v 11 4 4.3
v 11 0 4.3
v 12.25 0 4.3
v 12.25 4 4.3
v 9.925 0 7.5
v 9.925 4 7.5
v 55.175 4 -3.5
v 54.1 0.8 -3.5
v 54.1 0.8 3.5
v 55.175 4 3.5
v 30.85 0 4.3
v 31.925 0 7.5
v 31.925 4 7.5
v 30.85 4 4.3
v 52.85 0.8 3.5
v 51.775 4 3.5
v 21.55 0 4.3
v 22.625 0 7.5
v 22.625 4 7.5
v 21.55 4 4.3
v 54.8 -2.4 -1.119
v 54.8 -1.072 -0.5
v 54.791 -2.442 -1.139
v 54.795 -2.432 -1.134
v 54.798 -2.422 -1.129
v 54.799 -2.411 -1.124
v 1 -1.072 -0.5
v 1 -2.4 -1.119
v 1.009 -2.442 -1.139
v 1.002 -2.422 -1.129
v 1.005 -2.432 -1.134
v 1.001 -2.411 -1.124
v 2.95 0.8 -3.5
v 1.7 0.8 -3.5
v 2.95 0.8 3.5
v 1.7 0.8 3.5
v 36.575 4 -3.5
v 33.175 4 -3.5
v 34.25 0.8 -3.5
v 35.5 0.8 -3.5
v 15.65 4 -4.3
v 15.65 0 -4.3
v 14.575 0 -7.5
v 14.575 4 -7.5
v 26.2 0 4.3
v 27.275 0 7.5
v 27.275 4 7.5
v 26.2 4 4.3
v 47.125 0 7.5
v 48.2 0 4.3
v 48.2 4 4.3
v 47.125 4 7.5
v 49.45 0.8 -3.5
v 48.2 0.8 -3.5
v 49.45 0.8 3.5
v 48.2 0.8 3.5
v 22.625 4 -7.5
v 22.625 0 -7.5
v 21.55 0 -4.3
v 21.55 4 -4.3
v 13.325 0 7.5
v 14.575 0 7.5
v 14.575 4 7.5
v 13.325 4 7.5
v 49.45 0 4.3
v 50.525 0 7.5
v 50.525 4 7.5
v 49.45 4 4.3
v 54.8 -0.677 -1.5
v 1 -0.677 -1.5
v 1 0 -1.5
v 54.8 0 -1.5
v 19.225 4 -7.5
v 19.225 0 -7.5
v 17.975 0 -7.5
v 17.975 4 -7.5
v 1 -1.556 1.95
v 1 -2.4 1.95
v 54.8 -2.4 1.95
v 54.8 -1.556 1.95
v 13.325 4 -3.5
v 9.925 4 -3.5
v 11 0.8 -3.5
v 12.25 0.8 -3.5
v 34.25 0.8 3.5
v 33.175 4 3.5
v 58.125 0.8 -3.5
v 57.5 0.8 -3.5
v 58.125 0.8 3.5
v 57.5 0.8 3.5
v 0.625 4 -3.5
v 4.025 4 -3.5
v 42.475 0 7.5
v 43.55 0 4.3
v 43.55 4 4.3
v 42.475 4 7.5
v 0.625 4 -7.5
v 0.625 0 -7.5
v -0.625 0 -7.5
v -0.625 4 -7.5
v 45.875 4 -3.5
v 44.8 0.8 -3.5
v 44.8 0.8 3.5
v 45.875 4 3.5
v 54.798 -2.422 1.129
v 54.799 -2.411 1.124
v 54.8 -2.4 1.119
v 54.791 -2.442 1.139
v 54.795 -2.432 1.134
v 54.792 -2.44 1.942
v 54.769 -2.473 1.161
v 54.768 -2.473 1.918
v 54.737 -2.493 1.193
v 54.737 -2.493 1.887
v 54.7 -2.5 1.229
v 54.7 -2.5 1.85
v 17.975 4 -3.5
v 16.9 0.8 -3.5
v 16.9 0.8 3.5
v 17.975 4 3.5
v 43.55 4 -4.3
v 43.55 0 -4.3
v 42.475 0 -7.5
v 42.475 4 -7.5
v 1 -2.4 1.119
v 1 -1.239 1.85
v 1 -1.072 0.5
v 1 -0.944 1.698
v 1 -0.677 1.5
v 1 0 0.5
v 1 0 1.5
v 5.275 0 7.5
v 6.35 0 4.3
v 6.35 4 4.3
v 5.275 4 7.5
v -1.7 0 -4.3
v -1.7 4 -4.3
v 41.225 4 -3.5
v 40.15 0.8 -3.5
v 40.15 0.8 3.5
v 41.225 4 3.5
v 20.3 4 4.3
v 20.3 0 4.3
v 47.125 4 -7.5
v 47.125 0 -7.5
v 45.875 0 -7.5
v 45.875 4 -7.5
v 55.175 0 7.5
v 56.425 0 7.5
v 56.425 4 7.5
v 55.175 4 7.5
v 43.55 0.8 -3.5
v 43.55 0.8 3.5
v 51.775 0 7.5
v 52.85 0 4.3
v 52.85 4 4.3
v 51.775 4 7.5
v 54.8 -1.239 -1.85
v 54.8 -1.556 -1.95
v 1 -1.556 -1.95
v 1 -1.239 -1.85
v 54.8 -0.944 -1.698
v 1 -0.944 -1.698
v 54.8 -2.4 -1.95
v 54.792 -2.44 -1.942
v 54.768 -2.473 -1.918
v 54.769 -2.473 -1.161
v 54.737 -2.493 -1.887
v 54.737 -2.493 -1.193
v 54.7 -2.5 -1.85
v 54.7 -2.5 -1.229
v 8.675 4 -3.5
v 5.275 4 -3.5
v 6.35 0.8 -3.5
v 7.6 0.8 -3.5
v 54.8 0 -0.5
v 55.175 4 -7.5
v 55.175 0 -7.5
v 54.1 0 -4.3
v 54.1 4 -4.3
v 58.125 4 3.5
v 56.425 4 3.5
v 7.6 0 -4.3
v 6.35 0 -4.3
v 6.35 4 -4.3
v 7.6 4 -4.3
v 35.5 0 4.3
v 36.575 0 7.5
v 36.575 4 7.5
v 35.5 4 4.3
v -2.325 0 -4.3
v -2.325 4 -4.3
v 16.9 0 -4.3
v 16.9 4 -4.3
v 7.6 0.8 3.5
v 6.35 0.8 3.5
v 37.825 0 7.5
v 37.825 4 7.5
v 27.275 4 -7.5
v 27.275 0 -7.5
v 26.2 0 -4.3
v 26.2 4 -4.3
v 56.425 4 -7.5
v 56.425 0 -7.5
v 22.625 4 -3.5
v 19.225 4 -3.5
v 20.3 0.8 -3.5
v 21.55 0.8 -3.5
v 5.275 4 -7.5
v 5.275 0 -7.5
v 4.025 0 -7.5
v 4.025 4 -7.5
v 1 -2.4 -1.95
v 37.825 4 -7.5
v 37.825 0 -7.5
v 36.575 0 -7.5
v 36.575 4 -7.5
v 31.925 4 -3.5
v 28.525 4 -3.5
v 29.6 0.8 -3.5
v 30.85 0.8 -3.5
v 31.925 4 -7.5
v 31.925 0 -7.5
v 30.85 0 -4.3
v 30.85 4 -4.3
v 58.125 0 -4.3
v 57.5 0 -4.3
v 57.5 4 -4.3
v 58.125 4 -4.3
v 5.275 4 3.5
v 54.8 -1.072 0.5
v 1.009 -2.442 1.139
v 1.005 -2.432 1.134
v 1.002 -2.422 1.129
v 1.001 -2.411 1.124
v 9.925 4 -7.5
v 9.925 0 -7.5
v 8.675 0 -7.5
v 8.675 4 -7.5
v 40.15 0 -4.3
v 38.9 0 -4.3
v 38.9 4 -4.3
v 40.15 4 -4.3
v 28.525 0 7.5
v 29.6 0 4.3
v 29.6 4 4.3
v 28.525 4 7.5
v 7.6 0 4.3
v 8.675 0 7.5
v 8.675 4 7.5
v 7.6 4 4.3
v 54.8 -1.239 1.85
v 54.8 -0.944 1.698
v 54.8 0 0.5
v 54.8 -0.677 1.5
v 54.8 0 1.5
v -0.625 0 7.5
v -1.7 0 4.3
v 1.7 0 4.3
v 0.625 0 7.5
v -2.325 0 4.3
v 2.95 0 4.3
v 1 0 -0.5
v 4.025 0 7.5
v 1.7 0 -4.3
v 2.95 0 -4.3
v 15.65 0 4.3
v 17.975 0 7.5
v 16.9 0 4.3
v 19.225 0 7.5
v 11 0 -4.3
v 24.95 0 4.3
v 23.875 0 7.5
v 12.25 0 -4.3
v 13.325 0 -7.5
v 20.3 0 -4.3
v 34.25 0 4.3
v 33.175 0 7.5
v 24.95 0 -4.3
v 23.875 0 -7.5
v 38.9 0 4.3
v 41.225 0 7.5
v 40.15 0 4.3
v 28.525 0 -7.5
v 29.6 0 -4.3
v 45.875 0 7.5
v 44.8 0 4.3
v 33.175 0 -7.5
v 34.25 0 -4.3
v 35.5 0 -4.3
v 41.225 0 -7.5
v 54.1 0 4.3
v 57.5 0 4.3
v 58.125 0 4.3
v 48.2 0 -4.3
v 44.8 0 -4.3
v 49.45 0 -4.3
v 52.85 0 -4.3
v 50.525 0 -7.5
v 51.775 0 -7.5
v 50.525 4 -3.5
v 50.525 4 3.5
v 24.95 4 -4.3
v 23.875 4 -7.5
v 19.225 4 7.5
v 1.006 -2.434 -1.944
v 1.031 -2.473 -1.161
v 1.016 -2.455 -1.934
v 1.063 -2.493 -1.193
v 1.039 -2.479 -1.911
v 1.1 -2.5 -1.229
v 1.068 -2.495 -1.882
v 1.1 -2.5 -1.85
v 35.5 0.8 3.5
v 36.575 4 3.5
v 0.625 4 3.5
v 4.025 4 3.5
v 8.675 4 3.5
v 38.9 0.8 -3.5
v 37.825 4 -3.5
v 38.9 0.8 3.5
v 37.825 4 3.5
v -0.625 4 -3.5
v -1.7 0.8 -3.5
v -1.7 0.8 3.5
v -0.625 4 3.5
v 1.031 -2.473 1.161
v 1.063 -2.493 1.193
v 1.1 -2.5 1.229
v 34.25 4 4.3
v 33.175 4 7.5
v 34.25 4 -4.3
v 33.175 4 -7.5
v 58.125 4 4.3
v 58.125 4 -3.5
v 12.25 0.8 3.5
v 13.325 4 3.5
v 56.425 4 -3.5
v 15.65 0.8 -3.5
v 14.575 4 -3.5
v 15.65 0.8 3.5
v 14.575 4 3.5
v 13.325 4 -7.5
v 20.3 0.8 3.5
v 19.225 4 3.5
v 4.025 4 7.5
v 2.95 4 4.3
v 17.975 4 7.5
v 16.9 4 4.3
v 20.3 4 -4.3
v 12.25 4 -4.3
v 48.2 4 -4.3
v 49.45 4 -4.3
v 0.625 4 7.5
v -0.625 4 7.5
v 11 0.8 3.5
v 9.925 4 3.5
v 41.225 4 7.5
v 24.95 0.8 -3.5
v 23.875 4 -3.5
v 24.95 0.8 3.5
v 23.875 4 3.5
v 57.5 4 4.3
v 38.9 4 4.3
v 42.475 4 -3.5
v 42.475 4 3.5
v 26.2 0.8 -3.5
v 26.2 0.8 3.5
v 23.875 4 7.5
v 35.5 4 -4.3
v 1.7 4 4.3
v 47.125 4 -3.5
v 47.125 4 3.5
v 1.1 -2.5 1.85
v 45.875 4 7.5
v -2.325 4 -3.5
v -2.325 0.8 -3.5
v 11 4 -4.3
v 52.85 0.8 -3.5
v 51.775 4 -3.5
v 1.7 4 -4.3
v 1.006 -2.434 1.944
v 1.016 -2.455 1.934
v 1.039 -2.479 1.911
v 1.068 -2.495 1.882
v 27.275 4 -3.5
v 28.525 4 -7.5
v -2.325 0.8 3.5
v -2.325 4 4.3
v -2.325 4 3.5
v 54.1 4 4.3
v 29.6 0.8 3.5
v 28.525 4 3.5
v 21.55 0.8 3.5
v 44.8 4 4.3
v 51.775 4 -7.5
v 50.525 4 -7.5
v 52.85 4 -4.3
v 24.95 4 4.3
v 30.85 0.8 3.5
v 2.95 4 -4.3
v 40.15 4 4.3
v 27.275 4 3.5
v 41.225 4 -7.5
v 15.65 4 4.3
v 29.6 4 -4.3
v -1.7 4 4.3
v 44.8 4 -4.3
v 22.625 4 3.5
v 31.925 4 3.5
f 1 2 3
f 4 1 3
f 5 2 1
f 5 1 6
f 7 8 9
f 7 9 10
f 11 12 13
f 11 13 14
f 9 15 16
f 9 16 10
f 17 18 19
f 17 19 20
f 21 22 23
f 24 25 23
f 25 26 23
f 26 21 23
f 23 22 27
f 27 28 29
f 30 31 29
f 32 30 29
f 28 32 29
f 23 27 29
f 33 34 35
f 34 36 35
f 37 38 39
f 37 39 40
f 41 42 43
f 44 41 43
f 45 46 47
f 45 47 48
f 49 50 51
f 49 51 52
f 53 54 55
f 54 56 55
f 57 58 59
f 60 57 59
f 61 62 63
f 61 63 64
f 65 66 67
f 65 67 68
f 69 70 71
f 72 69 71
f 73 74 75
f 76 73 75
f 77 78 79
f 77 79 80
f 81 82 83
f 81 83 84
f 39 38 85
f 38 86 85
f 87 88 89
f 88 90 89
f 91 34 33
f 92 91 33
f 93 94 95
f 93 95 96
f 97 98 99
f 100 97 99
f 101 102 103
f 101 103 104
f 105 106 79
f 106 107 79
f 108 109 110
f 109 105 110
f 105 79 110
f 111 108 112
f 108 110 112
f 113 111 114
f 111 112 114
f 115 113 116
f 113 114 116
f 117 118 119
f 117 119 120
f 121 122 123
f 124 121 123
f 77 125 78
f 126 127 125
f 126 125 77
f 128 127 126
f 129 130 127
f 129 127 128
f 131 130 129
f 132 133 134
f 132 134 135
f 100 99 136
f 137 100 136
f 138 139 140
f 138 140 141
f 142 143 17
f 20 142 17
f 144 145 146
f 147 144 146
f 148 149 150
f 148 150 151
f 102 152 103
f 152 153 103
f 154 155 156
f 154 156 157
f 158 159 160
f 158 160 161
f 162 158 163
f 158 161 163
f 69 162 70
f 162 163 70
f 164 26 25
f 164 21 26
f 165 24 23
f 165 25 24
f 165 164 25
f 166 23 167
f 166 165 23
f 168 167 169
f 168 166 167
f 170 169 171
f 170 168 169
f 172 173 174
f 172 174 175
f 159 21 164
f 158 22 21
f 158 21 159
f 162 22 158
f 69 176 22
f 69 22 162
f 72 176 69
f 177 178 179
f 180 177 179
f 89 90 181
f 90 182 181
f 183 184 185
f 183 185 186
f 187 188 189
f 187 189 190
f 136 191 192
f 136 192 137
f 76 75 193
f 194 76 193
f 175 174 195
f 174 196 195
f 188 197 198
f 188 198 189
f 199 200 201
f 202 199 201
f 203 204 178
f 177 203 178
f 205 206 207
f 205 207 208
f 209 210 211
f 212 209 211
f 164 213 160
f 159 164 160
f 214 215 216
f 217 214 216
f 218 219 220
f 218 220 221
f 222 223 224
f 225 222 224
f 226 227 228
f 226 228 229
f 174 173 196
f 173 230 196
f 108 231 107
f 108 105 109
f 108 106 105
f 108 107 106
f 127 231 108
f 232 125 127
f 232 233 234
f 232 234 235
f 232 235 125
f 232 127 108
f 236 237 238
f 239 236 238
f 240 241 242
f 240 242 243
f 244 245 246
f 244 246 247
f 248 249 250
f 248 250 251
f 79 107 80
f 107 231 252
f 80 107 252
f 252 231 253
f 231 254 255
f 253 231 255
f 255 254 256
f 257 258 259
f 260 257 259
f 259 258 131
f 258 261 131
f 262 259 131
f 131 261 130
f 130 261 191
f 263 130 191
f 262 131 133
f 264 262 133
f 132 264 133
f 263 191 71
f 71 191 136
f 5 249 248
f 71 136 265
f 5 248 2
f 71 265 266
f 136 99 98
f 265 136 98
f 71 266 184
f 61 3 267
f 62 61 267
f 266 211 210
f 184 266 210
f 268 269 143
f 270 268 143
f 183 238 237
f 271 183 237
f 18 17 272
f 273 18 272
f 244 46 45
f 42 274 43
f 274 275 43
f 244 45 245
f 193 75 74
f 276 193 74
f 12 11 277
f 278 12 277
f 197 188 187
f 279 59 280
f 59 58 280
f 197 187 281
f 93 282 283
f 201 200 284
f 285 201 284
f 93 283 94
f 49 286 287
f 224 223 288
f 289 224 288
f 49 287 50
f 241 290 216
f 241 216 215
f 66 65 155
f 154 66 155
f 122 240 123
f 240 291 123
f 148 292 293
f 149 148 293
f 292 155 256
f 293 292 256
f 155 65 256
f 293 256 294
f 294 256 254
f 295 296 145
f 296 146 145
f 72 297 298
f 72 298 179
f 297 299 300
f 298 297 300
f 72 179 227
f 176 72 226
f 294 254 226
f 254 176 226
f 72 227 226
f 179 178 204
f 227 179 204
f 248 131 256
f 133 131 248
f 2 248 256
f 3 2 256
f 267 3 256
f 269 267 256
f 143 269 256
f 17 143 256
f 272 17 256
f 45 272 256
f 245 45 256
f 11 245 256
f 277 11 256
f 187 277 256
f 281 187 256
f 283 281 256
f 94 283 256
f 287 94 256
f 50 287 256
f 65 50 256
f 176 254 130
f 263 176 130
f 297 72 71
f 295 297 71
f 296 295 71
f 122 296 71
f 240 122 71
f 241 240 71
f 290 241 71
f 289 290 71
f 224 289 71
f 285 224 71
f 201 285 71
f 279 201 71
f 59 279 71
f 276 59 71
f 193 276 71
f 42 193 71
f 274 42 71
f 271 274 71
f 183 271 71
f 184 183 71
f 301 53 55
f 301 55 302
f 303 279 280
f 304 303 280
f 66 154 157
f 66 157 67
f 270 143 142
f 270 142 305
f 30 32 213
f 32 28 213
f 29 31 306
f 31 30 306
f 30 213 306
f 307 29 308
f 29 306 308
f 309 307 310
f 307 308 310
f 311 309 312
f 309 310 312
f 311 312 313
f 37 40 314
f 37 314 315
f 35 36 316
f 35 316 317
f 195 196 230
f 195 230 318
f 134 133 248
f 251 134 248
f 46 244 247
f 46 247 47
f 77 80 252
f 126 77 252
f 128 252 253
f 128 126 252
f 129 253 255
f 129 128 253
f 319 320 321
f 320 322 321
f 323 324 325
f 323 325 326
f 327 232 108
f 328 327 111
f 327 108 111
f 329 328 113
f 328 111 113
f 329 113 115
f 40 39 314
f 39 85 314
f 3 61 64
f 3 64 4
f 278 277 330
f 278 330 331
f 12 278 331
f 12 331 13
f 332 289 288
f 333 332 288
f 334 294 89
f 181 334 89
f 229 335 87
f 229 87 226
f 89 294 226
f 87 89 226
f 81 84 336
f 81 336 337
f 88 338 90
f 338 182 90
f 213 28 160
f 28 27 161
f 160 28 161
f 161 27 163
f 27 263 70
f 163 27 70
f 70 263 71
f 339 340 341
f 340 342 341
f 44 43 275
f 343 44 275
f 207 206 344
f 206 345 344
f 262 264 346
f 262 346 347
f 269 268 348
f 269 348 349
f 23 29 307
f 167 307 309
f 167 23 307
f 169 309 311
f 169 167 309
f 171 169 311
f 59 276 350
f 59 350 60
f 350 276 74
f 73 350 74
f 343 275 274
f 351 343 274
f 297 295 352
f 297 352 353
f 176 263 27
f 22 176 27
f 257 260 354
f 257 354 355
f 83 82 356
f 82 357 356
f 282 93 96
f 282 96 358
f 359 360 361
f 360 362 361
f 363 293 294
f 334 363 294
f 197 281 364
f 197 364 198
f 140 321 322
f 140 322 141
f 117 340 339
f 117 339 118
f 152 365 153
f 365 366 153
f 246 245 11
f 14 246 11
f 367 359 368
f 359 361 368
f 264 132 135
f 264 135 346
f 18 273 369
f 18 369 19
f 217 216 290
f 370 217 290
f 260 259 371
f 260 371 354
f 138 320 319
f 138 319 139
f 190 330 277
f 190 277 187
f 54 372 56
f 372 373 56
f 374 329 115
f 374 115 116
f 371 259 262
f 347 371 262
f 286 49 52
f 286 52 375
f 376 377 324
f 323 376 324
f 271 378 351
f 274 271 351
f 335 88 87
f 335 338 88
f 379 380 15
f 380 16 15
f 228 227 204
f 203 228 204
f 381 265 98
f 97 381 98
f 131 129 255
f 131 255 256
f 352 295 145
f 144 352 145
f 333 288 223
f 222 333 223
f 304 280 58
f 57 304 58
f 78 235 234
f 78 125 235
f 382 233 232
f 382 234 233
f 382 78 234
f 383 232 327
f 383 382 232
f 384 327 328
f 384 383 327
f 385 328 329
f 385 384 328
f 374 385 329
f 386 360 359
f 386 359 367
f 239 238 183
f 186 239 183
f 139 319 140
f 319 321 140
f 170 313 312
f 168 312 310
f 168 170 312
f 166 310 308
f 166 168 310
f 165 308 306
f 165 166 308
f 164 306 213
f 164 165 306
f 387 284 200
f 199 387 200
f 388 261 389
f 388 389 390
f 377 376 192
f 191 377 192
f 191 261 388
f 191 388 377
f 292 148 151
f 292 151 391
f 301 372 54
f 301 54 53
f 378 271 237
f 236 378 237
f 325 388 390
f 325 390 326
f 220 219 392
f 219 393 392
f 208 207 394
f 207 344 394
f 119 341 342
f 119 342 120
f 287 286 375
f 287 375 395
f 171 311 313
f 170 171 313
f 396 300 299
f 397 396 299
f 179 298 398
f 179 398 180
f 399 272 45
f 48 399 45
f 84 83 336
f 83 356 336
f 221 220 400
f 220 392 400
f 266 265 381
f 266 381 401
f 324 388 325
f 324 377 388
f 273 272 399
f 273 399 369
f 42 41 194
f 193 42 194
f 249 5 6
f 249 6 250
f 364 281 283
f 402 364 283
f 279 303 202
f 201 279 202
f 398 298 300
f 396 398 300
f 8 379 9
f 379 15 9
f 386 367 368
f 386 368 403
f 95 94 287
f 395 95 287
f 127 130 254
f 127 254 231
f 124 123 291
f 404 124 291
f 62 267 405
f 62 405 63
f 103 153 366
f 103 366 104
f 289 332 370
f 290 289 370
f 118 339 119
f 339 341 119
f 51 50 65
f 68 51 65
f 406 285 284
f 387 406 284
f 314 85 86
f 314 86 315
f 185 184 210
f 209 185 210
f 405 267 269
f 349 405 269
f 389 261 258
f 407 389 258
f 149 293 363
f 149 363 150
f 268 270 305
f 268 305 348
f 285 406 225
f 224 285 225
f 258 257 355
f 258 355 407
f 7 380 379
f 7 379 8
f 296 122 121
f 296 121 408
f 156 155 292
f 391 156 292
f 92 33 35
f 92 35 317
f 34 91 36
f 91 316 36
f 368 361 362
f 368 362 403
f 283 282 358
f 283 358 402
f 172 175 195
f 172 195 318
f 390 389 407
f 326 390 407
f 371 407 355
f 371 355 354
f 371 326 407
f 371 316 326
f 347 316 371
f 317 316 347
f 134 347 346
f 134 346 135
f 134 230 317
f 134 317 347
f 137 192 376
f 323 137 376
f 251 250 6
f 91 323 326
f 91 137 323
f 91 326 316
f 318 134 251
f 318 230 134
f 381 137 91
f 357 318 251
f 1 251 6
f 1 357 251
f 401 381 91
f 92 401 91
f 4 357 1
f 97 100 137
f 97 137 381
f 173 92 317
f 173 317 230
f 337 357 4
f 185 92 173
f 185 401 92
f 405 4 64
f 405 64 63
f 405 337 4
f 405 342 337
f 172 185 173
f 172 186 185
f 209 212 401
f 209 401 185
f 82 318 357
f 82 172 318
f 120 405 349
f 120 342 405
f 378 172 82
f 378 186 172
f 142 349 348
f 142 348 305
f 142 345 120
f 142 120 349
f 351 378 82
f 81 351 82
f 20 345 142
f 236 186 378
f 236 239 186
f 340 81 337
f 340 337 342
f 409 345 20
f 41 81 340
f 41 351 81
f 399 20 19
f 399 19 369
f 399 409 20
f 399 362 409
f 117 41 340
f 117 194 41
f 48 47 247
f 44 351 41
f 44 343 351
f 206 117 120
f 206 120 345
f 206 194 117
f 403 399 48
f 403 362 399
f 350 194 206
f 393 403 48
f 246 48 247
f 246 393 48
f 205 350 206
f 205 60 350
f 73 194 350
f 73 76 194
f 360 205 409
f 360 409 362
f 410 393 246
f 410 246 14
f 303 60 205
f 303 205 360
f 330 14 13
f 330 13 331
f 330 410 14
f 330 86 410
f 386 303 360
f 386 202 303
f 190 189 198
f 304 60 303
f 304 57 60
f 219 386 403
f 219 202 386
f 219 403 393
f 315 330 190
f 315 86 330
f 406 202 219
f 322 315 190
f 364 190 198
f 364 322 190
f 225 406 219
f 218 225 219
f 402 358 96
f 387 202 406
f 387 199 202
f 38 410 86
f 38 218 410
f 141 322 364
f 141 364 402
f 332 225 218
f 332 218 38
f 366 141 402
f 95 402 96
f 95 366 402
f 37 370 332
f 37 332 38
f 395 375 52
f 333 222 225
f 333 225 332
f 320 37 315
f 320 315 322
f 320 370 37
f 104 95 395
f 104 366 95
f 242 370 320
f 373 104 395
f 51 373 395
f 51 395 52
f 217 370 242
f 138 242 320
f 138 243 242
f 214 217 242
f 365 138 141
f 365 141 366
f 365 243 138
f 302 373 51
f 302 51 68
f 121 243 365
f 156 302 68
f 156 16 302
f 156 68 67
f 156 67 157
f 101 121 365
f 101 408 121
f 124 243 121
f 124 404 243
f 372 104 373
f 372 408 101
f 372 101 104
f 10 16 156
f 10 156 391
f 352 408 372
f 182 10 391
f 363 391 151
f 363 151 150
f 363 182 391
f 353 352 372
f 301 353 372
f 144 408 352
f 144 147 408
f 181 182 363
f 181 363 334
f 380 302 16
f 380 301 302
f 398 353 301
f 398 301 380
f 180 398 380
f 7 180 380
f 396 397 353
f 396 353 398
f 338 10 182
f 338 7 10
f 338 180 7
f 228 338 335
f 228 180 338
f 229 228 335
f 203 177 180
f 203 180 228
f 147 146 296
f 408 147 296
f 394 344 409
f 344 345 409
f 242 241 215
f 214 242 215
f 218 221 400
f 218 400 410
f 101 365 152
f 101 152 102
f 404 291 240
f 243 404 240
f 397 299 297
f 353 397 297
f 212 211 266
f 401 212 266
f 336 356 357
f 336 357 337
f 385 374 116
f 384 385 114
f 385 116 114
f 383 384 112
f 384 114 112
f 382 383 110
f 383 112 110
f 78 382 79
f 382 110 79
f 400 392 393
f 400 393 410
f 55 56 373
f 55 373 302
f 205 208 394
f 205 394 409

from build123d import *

# Parameters (mm, degrees)
SKETCH_1_W                     = 4.65
SKETCH_1_H                     = 8.6
EXTRUDE_1_DEPTH                = 4
EXTRUDE_2_DEPTH                = 4
CUT_EXTRUDE_1_DEPTH            = 3.5
PATTERN_LINEAR_4_COUNT         = 13
PATTERN_LINEAR_4_PITCH         = 4.65
PATTERN_LINEAR_4_COPY_1_DEPTH  = 4
PATTERN_LINEAR_4_COPY_2_DEPTH  = 4
PATTERN_LINEAR_4_COPY_3_DEPTH  = 4
PATTERN_LINEAR_4_COPY_4_DEPTH  = 4
PATTERN_LINEAR_4_COPY_5_DEPTH  = 4
PATTERN_LINEAR_4_COPY_6_DEPTH  = 4
PATTERN_LINEAR_4_COPY_7_DEPTH  = 4
PATTERN_LINEAR_4_COPY_8_DEPTH  = 4
PATTERN_LINEAR_4_COPY_9_DEPTH  = 4
PATTERN_LINEAR_4_COPY_10_DEPTH = 4
PATTERN_LINEAR_4_COPY_11_DEPTH = 4
PATTERN_LINEAR_4_COPY_12_DEPTH = 4
EXTRUDE_START                  = 1
EXTRUDE_4_DEPTH                = 53.8
FILLET_1_R                     = 0.1


with BuildPart() as part:
    # 草图1 → 凸台-拉伸1 (new body)
    with BuildSketch(Plane(origin=(0, 0, 0), x_dir=(1, 0, 0), z_dir=(0, 1, 0))):
        Rectangle(SKETCH_1_W, SKETCH_1_H)
    extrude_1 = extrude(amount=EXTRUDE_1_DEPTH)

    # 草图3 → 凸台-拉伸2 (add)
    with BuildSketch(Plane(origin=(0, 0, 0), x_dir=(1, 0, 0), z_dir=(0, 1, 0))):
        Polygon((0.625, 7.5), (-0.625, 7.5), (-1.7, 4.3), (1.7, 4.3), align=None)
    extrude_2 = extrude(amount=EXTRUDE_2_DEPTH)

    # 镜向1: 凸台-拉伸2 across plane
    add(extrude_2.mirror(Plane.XY))

    # 草图4 → 切除-拉伸1 (cut, symmetric)
    with BuildSketch(Plane.XY):
        Polygon((-0.625, 4), (-2.325, 4), (-2.325, 0.8), (-1.7, 0.8), align=None)
        Polygon((1.7, 0.8), (2.325, 0.8), (2.325, 4), (0.625, 4), align=None)
    cut_extrude_1 = extrude(amount=CUT_EXTRUDE_1_DEPTH, both=True, mode=Mode.SUBTRACT)

    # 阵列(线性)4: 凸台-拉伸1, 凸台-拉伸2, 切除-拉伸1 ×13
    with Locations(*[(i * PATTERN_LINEAR_4_PITCH, 0, 0) for i in range(1, PATTERN_LINEAR_4_COUNT)]):
        add(extrude_1)
        add(extrude_2)
        add(cut_extrude_1, mode=Mode.SUBTRACT)

    # 阵列(线性)4 copy 1 sketch → 阵列(线性)4 copy 1 (add)
    with BuildSketch(Plane(origin=(4.65, 0, 0), x_dir=(1, 0, 0), z_dir=(0, 1, 0))):
        Polygon((0.625, -7.5), (-0.625, -7.5), (-1.7, -4.3), (1.7, -4.3), align=None)
    extrude(amount=PATTERN_LINEAR_4_COPY_1_DEPTH)

    # 阵列(线性)4 copy 2 sketch → 阵列(线性)4 copy 2 (add)
    with BuildSketch(Plane(origin=(9.3, 0, 0), x_dir=(1, 0, 0), z_dir=(0, 1, 0))):
        Polygon((0.625, -7.5), (-0.625, -7.5), (-1.7, -4.3), (1.7, -4.3), align=None)
    extrude(amount=PATTERN_LINEAR_4_COPY_2_DEPTH)

    # 阵列(线性)4 copy 3 sketch → 阵列(线性)4 copy 3 (add)
    with BuildSketch(Plane(origin=(13.95, 0, 0), x_dir=(1, 0, 0), z_dir=(0, 1, 0))):
        Polygon((0.625, -7.5), (-0.625, -7.5), (-1.7, -4.3), (1.7, -4.3), align=None)
    extrude(amount=PATTERN_LINEAR_4_COPY_3_DEPTH)

    # 阵列(线性)4 copy 4 sketch → 阵列(线性)4 copy 4 (add)
    with BuildSketch(Plane(origin=(18.6, 0, 0), x_dir=(1, 0, 0), z_dir=(0, 1, 0))):
        Polygon((0.625, -7.5), (-0.625, -7.5), (-1.7, -4.3), (1.7, -4.3), align=None)
    extrude(amount=PATTERN_LINEAR_4_COPY_4_DEPTH)

    # 阵列(线性)4 copy 5 sketch → 阵列(线性)4 copy 5 (add)
    with BuildSketch(Plane(origin=(23.25, 0, 0), x_dir=(1, 0, 0), z_dir=(0, 1, 0))):
        Polygon((0.625, -7.5), (-0.625, -7.5), (-1.7, -4.3), (1.7, -4.3), align=None)
    extrude(amount=PATTERN_LINEAR_4_COPY_5_DEPTH)

    # 阵列(线性)4 copy 6 sketch → 阵列(线性)4 copy 6 (add)
    with BuildSketch(Plane(origin=(27.9, 0, 0), x_dir=(1, 0, 0), z_dir=(0, 1, 0))):
        Polygon((0.625, -7.5), (-0.625, -7.5), (-1.7, -4.3), (1.7, -4.3), align=None)
    extrude(amount=PATTERN_LINEAR_4_COPY_6_DEPTH)

    # 阵列(线性)4 copy 7 sketch → 阵列(线性)4 copy 7 (add)
    with BuildSketch(Plane(origin=(32.55, 0, 0), x_dir=(1, 0, 0), z_dir=(0, 1, 0))):
        Polygon((0.625, -7.5), (-0.625, -7.5), (-1.7, -4.3), (1.7, -4.3), align=None)
    extrude(amount=PATTERN_LINEAR_4_COPY_7_DEPTH)

    # 阵列(线性)4 copy 8 sketch → 阵列(线性)4 copy 8 (add)
    with BuildSketch(Plane(origin=(37.2, 0, 0), x_dir=(1, 0, 0), z_dir=(0, 1, 0))):
        Polygon((0.625, -7.5), (-0.625, -7.5), (-1.7, -4.3), (1.7, -4.3), align=None)
    extrude(amount=PATTERN_LINEAR_4_COPY_8_DEPTH)

    # 阵列(线性)4 copy 9 sketch → 阵列(线性)4 copy 9 (add)
    with BuildSketch(Plane(origin=(41.85, 0, 0), x_dir=(1, 0, 0), z_dir=(0, 1, 0))):
        Polygon((0.625, -7.5), (-0.625, -7.5), (-1.7, -4.3), (1.7, -4.3), align=None)
    extrude(amount=PATTERN_LINEAR_4_COPY_9_DEPTH)

    # 阵列(线性)4 copy 10 sketch → 阵列(线性)4 copy 10 (add)
    with BuildSketch(Plane(origin=(46.5, 0, 0), x_dir=(1, 0, 0), z_dir=(0, 1, 0))):
        Polygon((0.625, -7.5), (-0.625, -7.5), (-1.7, -4.3), (1.7, -4.3), align=None)
    extrude(amount=PATTERN_LINEAR_4_COPY_10_DEPTH)

    # 阵列(线性)4 copy 11 sketch → 阵列(线性)4 copy 11 (add)
    with BuildSketch(Plane(origin=(51.15, 0, 0), x_dir=(1, 0, 0), z_dir=(0, 1, 0))):
        Polygon((0.625, -7.5), (-0.625, -7.5), (-1.7, -4.3), (1.7, -4.3), align=None)
    extrude(amount=PATTERN_LINEAR_4_COPY_11_DEPTH)

    # 阵列(线性)4 copy 12 sketch → 阵列(线性)4 copy 12 (add)
    with BuildSketch(Plane(origin=(55.8, 0, 0), x_dir=(1, 0, 0), z_dir=(0, 1, 0))):
        Polygon((0.625, -7.5), (-0.625, -7.5), (-1.7, -4.3), (1.7, -4.3), align=None)
    extrude(amount=PATTERN_LINEAR_4_COPY_12_DEPTH)

    # 草图6 → 凸台-拉伸4 (add)
    with BuildSketch(Plane(origin=(0, 0, 0), x_dir=(0, 0, -1), z_dir=(1, 0, 0)).offset(EXTRUDE_START)):
        with BuildLine():
            Line((1.5, 0), (0.5, 0))
            Line((0.5, 0), (0.5, -1.07225346))
            Line((0.5, -1.07225346), (1.165769145, -2.5))
            Line((1.165769145, -2.5), (1.95, -2.5))
            Line((1.95, -2.5), (1.95, -1.555590279))
            ThreePointArc((1.95, -1.555590279), (1.780042303, -1.088161527), (1.5, -0.677124344))
            Line((1.5, -0.677124344), (1.5, 0))
        make_face()
        with BuildLine():
            Line((-0.5, -1.07225346), (-1.165769145, -2.5))
            Line((-1.165769145, -2.5), (-1.95, -2.5))
            Line((-1.95, -2.5), (-1.95, -1.555590279))
            ThreePointArc((-1.95, -1.555590279), (-1.780042303, -1.088161527), (-1.5, -0.677124344))
            Line((-1.5, -0.677124344), (-1.5, 0))
            Line((-1.5, 0), (-0.5, 0))
            Line((-0.5, 0), (-0.5, -1.07225346))
        make_face()
    extrude(amount=EXTRUDE_4_DEPTH)

    # 圆角1
    fillet_1_edges = [part.edges().sort_by_distance(p)[0] for p in [
        (1, -2.5, -1.557884573),
        (27.9, -2.5, -1.165769145),
        (27.9, -2.5, -1.95),
        (54.8, -2.5, -1.557884573),
        (1, -2.5, 1.557884573),
        (27.9, -2.5, 1.95),
        (27.9, -2.5, 1.165769145),
        (54.8, -2.5, 1.557884573),
    ]]
    fillet(fillet_1_edges, radius=FILLET_1_R)


solid = part.part
